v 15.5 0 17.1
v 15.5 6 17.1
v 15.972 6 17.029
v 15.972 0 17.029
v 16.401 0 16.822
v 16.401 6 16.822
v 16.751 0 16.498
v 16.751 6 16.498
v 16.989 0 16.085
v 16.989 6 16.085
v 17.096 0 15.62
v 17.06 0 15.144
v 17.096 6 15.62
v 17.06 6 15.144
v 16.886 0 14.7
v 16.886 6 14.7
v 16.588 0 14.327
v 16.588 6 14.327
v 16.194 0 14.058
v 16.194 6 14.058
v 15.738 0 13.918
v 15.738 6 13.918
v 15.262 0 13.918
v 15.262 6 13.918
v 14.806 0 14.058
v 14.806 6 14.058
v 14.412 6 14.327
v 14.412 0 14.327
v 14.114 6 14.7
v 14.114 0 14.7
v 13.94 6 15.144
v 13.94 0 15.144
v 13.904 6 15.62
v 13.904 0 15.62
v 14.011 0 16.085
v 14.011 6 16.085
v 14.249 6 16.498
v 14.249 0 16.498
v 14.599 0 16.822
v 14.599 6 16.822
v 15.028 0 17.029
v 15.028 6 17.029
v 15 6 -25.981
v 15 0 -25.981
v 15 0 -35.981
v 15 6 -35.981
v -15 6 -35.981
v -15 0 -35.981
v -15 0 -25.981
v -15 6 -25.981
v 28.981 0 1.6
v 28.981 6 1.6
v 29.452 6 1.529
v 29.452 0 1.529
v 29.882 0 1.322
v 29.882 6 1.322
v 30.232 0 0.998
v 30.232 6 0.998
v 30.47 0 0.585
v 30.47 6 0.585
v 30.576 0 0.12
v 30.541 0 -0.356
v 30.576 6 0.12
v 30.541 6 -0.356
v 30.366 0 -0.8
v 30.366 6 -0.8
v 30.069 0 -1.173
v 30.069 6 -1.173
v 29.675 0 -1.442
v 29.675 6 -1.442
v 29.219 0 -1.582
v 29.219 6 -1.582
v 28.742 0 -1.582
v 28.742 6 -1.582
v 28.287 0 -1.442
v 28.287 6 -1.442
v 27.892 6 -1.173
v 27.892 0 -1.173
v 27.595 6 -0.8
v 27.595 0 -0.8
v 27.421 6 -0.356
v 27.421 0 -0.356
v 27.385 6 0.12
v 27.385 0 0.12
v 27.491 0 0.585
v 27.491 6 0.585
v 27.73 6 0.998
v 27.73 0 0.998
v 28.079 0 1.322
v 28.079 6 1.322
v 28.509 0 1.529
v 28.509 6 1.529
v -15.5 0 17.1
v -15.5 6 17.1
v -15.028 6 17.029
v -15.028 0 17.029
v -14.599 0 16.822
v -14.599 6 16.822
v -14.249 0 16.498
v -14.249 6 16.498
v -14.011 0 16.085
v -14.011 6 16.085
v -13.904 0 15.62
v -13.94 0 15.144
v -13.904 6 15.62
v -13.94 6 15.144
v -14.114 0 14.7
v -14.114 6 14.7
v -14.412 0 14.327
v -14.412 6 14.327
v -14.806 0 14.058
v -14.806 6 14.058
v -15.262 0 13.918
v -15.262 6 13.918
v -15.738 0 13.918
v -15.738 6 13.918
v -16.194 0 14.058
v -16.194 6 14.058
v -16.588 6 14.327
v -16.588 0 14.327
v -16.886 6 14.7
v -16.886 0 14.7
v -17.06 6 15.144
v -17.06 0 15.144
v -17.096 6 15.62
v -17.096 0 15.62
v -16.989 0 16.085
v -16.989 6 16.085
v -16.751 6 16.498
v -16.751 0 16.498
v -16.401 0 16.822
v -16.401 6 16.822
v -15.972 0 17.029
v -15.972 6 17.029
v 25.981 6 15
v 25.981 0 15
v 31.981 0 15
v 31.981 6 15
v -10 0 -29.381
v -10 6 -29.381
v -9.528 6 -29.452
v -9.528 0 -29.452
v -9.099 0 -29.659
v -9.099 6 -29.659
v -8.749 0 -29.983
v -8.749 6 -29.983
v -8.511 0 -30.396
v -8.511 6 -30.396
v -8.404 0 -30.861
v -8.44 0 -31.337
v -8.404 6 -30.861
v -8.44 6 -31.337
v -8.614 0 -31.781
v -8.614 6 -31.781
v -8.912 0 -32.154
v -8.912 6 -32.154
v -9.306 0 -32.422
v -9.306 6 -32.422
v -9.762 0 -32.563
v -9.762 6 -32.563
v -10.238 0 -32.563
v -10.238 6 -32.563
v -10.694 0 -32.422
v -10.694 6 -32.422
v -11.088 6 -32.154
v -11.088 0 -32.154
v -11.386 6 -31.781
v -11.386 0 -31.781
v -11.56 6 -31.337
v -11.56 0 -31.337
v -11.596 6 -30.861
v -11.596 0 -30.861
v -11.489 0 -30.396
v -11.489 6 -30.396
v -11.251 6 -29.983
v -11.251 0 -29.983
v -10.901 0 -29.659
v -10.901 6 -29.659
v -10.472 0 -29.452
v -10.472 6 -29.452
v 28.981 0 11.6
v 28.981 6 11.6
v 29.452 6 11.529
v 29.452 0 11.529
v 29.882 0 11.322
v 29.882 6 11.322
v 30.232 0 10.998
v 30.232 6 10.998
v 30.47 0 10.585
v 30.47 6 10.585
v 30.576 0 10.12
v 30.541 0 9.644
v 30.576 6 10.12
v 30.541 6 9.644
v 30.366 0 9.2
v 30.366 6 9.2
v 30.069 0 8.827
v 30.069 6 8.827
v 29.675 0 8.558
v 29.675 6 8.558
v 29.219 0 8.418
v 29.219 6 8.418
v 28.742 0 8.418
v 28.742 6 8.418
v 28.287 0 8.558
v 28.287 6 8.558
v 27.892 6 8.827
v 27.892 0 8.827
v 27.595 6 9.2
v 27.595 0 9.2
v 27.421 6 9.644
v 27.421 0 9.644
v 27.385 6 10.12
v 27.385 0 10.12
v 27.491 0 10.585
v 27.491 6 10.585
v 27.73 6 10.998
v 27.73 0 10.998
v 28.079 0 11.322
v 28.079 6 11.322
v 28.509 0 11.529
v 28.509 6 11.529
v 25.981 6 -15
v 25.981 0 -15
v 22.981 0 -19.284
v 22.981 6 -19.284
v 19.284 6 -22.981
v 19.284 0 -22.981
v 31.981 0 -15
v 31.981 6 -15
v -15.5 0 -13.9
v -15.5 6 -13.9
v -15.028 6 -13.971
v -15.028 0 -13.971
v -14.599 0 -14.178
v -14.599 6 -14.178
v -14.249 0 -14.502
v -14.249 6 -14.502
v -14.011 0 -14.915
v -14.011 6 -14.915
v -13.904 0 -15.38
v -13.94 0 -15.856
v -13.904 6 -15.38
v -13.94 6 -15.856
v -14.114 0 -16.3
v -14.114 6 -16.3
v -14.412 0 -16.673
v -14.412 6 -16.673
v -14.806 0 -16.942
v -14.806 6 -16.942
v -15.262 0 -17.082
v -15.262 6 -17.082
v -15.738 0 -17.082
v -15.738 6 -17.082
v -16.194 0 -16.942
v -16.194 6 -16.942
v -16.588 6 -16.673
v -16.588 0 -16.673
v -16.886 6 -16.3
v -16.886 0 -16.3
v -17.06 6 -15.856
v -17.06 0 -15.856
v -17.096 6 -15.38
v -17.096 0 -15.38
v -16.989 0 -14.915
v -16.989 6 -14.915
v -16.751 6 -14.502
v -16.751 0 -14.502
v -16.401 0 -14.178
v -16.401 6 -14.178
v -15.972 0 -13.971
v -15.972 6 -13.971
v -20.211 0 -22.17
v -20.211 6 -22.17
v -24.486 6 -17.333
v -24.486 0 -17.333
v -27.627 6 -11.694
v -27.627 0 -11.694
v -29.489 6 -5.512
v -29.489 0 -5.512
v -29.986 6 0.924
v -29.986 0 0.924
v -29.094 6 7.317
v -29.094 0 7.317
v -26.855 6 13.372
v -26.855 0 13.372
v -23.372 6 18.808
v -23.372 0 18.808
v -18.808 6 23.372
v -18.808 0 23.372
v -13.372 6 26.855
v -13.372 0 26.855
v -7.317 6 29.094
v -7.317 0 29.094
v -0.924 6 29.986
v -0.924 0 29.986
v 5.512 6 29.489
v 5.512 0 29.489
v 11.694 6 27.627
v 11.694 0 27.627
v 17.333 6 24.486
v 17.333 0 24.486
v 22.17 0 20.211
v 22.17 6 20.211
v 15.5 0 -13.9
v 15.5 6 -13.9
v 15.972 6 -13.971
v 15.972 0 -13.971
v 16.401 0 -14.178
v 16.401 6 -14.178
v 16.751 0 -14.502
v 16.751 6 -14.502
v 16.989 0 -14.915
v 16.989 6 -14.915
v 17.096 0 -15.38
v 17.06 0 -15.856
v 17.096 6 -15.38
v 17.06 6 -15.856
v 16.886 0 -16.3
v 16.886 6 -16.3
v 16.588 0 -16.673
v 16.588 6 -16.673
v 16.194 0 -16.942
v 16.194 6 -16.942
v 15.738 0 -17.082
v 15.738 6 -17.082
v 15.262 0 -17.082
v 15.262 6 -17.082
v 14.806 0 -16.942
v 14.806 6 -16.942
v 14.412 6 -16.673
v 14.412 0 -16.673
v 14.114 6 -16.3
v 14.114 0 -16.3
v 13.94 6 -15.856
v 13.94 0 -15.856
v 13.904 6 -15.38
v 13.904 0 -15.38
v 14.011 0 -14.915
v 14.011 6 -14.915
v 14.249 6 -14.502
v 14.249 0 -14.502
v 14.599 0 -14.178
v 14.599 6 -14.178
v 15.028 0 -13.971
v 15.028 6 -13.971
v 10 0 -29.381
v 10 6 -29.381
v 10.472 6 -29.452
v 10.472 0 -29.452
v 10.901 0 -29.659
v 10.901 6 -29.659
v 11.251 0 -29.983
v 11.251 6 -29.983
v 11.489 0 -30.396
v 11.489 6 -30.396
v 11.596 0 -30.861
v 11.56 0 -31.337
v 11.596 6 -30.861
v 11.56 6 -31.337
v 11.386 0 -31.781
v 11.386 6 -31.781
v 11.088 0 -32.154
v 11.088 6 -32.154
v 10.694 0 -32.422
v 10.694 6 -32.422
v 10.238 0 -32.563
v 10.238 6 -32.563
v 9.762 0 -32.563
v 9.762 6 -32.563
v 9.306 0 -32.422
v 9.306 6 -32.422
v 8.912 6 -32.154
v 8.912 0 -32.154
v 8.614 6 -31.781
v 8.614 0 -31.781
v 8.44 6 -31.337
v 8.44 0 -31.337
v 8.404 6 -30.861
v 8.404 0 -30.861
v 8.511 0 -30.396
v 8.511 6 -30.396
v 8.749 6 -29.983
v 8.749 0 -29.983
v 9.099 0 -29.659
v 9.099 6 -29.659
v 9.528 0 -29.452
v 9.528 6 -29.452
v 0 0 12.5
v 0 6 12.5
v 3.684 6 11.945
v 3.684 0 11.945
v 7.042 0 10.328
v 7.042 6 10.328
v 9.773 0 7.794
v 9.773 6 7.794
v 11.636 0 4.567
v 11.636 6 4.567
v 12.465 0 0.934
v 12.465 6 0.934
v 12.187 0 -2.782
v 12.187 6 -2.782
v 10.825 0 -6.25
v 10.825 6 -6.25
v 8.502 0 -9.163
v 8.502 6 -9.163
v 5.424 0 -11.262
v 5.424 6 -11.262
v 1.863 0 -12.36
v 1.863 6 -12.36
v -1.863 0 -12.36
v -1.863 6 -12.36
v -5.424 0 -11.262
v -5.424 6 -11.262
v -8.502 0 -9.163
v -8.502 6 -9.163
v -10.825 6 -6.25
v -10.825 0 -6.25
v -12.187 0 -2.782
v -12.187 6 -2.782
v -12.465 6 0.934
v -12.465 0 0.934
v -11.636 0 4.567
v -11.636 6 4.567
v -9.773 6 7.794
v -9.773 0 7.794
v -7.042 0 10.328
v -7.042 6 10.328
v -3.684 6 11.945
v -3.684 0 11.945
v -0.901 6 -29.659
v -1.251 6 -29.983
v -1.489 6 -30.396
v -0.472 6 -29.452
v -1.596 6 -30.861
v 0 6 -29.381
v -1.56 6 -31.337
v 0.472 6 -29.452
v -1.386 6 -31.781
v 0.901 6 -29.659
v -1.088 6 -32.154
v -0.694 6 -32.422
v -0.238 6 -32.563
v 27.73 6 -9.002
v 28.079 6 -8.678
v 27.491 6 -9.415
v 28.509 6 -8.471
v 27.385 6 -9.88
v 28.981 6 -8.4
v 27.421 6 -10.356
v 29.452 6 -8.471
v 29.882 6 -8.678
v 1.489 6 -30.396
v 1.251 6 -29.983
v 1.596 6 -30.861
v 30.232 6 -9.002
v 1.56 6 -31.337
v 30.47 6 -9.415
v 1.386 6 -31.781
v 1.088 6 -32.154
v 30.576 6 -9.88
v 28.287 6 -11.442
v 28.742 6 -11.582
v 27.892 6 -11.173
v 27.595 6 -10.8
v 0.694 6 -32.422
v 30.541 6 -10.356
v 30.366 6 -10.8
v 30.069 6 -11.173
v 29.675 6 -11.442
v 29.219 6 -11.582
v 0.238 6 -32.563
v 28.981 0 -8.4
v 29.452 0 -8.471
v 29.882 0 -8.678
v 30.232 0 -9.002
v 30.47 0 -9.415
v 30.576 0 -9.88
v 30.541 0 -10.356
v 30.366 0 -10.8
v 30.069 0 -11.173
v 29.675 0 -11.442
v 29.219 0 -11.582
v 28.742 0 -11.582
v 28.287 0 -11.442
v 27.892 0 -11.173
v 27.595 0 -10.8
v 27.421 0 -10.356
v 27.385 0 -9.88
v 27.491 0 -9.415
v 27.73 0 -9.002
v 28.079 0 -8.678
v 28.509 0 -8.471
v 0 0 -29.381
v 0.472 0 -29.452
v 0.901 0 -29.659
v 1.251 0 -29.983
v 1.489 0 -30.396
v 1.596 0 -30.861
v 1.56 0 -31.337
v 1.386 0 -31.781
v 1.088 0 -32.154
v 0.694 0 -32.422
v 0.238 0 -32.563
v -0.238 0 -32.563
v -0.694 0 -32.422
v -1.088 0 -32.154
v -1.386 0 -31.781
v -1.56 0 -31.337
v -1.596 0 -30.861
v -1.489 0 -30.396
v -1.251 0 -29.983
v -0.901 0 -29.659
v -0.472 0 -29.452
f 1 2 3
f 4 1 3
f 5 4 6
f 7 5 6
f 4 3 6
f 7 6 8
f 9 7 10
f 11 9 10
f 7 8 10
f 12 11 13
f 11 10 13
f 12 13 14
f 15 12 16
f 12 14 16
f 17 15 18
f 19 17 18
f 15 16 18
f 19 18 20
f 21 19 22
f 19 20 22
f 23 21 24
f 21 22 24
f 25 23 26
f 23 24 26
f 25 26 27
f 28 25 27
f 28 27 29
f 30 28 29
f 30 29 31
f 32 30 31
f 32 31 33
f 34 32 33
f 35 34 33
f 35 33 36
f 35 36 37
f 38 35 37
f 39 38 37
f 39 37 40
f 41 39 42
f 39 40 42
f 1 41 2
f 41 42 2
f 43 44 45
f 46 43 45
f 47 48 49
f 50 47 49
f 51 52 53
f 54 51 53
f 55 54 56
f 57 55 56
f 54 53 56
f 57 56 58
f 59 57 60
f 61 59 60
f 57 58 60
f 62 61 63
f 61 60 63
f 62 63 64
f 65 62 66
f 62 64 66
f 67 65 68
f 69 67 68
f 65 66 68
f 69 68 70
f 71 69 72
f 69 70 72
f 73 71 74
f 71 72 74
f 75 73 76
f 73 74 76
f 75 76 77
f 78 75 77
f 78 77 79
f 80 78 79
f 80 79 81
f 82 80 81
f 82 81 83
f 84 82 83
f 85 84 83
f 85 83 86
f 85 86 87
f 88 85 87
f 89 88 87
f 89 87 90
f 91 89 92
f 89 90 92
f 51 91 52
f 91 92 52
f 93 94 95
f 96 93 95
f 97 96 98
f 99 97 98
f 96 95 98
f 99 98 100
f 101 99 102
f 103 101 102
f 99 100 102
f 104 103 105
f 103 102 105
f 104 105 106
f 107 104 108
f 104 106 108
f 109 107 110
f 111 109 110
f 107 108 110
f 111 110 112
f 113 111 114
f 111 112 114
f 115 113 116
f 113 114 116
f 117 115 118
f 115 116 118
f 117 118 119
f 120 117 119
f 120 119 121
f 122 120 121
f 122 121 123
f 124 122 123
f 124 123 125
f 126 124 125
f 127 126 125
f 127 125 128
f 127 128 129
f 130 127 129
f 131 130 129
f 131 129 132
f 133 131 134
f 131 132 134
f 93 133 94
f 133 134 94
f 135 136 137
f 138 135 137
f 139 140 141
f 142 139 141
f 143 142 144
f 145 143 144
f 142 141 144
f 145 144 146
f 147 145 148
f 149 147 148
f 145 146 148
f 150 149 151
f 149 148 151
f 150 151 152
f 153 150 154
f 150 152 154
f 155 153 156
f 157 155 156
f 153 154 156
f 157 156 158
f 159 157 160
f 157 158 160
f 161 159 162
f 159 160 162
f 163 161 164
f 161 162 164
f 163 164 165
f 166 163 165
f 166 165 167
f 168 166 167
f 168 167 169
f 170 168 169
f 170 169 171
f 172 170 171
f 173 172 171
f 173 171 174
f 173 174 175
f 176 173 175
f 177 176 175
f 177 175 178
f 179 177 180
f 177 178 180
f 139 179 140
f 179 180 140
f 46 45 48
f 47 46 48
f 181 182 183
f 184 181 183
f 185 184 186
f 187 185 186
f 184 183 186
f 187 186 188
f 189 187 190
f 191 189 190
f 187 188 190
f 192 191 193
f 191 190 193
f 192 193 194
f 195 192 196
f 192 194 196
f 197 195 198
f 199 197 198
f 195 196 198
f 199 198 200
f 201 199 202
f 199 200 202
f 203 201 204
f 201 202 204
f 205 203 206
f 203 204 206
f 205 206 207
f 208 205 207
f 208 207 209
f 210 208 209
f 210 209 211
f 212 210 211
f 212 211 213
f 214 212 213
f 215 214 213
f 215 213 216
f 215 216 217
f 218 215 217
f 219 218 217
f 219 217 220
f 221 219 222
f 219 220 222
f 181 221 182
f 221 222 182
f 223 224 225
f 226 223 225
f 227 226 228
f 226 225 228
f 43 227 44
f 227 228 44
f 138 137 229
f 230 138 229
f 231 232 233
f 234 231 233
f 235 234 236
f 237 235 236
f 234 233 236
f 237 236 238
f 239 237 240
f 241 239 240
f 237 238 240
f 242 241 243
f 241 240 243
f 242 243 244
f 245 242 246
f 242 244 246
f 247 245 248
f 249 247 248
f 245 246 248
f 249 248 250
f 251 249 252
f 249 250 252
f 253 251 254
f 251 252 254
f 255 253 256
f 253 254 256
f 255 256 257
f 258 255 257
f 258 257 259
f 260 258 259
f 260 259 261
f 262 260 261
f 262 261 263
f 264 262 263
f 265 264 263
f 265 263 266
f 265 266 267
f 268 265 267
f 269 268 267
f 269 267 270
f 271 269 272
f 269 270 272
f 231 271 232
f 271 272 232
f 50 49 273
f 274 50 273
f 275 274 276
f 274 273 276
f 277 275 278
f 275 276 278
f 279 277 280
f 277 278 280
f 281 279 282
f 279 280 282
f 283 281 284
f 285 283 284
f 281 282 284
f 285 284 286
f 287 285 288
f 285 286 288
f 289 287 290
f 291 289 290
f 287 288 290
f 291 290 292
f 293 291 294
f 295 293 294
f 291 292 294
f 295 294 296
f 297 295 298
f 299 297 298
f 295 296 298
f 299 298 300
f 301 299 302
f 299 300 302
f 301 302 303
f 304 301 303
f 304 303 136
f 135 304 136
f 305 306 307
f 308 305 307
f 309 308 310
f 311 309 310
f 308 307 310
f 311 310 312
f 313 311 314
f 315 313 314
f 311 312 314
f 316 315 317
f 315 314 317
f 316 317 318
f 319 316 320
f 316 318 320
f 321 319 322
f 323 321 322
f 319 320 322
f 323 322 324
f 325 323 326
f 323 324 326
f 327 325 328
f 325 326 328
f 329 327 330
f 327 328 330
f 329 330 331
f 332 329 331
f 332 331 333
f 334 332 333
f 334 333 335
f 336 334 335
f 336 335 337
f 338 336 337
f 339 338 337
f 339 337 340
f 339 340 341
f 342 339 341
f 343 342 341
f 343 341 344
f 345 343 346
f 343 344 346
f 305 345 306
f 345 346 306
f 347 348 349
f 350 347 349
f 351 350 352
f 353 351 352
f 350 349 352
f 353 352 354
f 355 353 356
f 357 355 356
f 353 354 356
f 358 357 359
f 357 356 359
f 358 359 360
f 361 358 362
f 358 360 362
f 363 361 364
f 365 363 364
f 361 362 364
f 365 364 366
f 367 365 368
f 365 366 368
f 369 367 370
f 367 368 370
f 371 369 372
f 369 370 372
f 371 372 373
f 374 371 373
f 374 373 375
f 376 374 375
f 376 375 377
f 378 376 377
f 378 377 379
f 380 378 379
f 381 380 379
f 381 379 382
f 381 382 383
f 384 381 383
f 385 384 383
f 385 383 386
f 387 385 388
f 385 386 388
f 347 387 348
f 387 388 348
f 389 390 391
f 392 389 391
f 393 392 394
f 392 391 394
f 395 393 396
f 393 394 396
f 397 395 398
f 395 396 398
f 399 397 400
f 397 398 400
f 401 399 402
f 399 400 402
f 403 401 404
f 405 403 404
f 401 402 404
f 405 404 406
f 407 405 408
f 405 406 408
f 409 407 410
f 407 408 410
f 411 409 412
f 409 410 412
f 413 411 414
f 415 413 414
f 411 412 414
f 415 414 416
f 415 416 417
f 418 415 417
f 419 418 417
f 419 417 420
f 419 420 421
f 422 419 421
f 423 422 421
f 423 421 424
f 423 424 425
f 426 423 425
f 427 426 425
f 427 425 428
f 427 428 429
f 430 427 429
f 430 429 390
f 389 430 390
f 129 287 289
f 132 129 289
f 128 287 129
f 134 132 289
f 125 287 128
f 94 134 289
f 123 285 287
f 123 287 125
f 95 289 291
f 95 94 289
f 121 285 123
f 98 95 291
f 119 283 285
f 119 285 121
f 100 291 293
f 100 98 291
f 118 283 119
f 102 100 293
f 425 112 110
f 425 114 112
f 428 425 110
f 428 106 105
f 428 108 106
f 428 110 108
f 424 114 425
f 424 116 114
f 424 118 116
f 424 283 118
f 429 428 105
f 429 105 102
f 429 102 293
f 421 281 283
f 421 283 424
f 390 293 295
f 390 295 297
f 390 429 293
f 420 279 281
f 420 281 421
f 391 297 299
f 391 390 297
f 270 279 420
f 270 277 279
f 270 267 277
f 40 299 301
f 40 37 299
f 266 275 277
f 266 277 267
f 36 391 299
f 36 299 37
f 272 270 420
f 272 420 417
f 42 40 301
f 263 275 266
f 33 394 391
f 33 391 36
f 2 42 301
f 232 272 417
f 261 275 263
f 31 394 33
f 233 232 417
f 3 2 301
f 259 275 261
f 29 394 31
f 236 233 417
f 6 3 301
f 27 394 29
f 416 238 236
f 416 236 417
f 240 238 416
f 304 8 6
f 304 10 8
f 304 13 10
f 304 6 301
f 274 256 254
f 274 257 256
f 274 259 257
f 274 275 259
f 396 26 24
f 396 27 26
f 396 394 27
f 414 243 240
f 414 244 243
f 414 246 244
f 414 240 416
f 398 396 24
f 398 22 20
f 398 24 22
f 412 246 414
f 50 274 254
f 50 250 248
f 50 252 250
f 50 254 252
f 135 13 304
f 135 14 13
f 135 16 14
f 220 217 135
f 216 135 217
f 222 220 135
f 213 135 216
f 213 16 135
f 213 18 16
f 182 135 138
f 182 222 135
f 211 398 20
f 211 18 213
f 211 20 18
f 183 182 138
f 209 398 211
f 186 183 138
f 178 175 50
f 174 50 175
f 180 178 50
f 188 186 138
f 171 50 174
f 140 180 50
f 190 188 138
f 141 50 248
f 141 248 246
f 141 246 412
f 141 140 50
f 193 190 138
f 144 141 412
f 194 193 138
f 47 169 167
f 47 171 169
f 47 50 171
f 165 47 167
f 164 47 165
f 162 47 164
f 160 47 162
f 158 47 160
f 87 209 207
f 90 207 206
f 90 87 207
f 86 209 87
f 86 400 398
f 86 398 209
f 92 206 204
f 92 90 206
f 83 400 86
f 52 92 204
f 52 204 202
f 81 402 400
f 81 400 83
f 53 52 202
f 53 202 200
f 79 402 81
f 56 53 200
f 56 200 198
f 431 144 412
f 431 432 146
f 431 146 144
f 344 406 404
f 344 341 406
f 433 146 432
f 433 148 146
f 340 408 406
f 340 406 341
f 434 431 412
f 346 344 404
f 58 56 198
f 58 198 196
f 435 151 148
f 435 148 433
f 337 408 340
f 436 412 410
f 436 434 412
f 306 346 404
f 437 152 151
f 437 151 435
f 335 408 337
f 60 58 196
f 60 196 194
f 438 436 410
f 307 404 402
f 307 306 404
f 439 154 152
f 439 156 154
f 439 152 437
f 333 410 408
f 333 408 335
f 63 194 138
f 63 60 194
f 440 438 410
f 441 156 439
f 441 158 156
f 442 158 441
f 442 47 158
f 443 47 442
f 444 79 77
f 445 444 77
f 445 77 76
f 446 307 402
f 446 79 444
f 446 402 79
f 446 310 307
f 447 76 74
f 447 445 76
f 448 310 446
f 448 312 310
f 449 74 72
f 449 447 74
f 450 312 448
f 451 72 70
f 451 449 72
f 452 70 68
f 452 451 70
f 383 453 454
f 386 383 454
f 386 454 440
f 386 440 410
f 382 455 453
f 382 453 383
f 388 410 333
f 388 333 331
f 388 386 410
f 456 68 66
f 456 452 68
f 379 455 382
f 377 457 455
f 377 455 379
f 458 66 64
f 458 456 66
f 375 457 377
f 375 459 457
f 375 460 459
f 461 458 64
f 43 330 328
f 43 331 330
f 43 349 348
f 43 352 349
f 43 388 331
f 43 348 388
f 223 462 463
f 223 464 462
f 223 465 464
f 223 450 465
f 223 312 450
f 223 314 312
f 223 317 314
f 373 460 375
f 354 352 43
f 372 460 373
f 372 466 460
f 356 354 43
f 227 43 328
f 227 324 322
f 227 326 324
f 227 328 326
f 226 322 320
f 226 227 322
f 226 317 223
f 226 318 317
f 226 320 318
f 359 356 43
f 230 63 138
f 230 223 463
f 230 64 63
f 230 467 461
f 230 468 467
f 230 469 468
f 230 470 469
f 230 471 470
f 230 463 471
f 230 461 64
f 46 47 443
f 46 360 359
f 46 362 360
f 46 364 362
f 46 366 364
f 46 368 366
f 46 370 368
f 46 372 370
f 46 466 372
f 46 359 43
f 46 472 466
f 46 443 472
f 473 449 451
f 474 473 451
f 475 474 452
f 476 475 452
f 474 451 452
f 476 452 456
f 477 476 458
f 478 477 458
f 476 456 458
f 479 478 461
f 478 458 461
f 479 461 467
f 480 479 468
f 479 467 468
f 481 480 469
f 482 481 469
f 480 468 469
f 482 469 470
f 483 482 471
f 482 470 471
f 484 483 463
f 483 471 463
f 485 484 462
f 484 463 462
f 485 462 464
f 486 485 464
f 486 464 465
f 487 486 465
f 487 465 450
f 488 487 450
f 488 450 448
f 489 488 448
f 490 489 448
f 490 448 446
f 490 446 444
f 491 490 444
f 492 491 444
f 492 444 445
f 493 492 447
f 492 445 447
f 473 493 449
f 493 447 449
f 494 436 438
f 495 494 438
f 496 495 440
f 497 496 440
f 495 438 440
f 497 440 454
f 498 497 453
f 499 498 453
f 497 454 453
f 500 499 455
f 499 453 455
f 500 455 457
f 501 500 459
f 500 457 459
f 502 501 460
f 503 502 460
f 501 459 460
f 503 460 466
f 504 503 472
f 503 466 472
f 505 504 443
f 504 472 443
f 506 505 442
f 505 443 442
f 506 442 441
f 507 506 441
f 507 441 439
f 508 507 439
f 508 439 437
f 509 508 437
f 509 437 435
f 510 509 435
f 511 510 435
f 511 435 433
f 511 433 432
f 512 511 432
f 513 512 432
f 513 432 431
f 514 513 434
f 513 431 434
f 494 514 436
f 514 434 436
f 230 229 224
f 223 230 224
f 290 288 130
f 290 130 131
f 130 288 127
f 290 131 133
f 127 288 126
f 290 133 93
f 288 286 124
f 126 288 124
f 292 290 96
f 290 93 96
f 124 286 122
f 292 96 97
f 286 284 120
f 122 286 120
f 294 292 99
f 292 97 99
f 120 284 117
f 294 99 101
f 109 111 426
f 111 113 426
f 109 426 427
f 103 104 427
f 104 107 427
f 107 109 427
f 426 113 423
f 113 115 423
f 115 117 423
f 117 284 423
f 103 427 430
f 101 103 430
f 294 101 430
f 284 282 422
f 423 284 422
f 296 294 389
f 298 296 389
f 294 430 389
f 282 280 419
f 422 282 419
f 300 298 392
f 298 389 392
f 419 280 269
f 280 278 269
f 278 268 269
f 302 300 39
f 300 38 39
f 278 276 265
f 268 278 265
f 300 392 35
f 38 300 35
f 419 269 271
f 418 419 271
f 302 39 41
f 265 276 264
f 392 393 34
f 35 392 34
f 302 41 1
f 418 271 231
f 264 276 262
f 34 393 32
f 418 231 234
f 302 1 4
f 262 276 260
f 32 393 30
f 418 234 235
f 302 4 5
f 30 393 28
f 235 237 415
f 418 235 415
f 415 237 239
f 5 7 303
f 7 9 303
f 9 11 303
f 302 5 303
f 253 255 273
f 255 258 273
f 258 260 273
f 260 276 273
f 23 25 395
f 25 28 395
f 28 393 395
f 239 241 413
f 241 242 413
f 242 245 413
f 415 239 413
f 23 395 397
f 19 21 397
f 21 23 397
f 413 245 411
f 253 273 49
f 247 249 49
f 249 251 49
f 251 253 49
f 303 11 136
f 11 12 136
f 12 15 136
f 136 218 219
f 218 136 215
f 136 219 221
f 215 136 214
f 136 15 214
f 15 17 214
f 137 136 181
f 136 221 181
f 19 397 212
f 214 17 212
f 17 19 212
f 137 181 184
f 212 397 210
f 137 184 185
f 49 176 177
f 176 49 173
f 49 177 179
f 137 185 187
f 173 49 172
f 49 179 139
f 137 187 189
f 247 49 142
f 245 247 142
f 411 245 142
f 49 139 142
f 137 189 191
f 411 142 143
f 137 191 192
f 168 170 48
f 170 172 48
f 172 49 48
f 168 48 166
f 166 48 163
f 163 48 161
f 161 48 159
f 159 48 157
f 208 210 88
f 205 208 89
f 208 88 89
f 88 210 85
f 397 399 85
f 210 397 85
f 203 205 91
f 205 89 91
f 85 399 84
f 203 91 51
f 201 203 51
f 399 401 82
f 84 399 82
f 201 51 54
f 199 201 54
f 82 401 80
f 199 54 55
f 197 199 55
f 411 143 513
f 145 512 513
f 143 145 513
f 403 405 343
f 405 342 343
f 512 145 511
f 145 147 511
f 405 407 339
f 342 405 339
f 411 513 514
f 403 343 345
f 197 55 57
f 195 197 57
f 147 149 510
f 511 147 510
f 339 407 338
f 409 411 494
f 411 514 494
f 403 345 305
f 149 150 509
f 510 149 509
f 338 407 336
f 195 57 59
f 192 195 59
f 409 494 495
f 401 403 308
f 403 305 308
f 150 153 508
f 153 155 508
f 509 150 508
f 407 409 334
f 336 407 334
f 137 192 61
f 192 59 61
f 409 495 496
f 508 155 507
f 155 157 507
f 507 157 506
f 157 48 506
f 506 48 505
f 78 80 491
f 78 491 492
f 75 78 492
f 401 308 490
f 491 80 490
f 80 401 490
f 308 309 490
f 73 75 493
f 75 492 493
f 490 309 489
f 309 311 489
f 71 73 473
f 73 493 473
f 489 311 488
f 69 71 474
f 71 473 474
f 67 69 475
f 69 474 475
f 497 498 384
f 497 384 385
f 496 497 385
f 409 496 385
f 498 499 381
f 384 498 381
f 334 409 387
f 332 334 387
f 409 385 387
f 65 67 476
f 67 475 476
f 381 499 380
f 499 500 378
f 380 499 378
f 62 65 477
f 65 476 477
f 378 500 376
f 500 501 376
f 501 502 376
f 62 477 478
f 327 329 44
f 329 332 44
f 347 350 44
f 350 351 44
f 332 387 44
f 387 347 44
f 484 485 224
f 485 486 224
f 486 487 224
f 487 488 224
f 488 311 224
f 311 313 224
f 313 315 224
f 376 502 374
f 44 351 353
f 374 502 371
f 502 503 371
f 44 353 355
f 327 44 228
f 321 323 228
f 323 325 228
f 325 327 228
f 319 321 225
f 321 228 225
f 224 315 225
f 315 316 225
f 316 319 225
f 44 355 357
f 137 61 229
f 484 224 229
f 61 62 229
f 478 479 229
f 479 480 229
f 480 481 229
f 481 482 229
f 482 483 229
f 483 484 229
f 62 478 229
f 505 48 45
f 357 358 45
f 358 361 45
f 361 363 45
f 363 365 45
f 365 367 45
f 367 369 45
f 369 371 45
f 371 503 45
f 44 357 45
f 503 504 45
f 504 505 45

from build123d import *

# Parameters (mm, degrees)
EXTRUDE_1_DEPTH     = 6
SKETCH_2_R          = 1.6
CUT_EXTRUDE_1_DEPTH = 6
SKETCH_3_R          = 12.5
CUT_EXTRUDE_2_DEPTH = 10


# Read off the part's stored shape, not the designer's step: 凸台-拉伸1
with BuildPart() as part:
    # 凸台-拉伸1 outline → 凸台-拉伸1 (new body)
    with BuildSketch(Plane(origin=(0, 0, 0), x_dir=(1, 0, 0), z_dir=(0, 1, 0))):
        with BuildLine():
            ThreePointArc((-15, 25.980762114), (-21.213203436, -21.213203436), (25.980762114, -15))
            Line((25.980762114, -15), (31.980762114, -15))
            Line((31.980762114, -15), (31.980762114, 15))
            Line((31.980762114, 15), (25.980762114, 15))
            ThreePointArc((25.980762114, 15), (21.213203436, 21.213203436), (15, 25.980762114))
            Line((15, 25.980762114), (15, 35.980762114))
            Line((15, 35.980762114), (-15, 35.980762114))
            Line((-15, 35.980762114), (-15, 25.980762114))
        make_face()
    extrude(amount=EXTRUDE_1_DEPTH)

    # 草图2 → 切除-拉伸1 (cut)
    with BuildSketch(Plane(origin=(0, 6, 0), x_dir=(1, 0, 0), z_dir=(0, 1, 0))):
        with Locations(Location((28.980762114, 10, 0), (0, 0, 270))):
            Circle(SKETCH_2_R)
        with Locations(Location((-15.5, 15.5, 0), (0, 0, 270))):
            Circle(SKETCH_2_R)
        with Locations(Location((15.5, 15.5, 0), (0, 0, 270))):
            Circle(SKETCH_2_R)
        with Locations(Location((-15.5, -15.5, 0), (0, 0, 270))):
            Circle(SKETCH_2_R)
        with Locations(Location((15.5, -15.5, 0), (0, 0, 270))):
            Circle(SKETCH_2_R)
        with Locations(Location((28.980762114, 0, 0), (0, 0, 270))):
            Circle(SKETCH_2_R)
        with Locations(Location((28.980762114, -10, 0), (0, 0, 270))):
            Circle(SKETCH_2_R)
        with Locations(Location((-10, 30.980762114, 0), (0, 0, 270))):
            Circle(SKETCH_2_R)
        with Locations(Location((0, 30.980762114, 0), (0, 0, 270))):
            Circle(SKETCH_2_R)
        with Locations(Location((10, 30.980762114, 0), (0, 0, 270))):
            Circle(SKETCH_2_R)
    extrude(amount=-CUT_EXTRUDE_1_DEPTH, mode=Mode.SUBTRACT)

    # 草图3 → 切除-拉伸2 (cut)
    with BuildSketch(Plane(origin=(0, 6, 0), x_dir=(1, 0, 0), z_dir=(0, 1, 0))):
        with Locations(Location((0, 0, 0), (0, 0, 270))):
            Circle(SKETCH_3_R)
    extrude(amount=-CUT_EXTRUDE_2_DEPTH, mode=Mode.SUBTRACT)


solid = part.part
